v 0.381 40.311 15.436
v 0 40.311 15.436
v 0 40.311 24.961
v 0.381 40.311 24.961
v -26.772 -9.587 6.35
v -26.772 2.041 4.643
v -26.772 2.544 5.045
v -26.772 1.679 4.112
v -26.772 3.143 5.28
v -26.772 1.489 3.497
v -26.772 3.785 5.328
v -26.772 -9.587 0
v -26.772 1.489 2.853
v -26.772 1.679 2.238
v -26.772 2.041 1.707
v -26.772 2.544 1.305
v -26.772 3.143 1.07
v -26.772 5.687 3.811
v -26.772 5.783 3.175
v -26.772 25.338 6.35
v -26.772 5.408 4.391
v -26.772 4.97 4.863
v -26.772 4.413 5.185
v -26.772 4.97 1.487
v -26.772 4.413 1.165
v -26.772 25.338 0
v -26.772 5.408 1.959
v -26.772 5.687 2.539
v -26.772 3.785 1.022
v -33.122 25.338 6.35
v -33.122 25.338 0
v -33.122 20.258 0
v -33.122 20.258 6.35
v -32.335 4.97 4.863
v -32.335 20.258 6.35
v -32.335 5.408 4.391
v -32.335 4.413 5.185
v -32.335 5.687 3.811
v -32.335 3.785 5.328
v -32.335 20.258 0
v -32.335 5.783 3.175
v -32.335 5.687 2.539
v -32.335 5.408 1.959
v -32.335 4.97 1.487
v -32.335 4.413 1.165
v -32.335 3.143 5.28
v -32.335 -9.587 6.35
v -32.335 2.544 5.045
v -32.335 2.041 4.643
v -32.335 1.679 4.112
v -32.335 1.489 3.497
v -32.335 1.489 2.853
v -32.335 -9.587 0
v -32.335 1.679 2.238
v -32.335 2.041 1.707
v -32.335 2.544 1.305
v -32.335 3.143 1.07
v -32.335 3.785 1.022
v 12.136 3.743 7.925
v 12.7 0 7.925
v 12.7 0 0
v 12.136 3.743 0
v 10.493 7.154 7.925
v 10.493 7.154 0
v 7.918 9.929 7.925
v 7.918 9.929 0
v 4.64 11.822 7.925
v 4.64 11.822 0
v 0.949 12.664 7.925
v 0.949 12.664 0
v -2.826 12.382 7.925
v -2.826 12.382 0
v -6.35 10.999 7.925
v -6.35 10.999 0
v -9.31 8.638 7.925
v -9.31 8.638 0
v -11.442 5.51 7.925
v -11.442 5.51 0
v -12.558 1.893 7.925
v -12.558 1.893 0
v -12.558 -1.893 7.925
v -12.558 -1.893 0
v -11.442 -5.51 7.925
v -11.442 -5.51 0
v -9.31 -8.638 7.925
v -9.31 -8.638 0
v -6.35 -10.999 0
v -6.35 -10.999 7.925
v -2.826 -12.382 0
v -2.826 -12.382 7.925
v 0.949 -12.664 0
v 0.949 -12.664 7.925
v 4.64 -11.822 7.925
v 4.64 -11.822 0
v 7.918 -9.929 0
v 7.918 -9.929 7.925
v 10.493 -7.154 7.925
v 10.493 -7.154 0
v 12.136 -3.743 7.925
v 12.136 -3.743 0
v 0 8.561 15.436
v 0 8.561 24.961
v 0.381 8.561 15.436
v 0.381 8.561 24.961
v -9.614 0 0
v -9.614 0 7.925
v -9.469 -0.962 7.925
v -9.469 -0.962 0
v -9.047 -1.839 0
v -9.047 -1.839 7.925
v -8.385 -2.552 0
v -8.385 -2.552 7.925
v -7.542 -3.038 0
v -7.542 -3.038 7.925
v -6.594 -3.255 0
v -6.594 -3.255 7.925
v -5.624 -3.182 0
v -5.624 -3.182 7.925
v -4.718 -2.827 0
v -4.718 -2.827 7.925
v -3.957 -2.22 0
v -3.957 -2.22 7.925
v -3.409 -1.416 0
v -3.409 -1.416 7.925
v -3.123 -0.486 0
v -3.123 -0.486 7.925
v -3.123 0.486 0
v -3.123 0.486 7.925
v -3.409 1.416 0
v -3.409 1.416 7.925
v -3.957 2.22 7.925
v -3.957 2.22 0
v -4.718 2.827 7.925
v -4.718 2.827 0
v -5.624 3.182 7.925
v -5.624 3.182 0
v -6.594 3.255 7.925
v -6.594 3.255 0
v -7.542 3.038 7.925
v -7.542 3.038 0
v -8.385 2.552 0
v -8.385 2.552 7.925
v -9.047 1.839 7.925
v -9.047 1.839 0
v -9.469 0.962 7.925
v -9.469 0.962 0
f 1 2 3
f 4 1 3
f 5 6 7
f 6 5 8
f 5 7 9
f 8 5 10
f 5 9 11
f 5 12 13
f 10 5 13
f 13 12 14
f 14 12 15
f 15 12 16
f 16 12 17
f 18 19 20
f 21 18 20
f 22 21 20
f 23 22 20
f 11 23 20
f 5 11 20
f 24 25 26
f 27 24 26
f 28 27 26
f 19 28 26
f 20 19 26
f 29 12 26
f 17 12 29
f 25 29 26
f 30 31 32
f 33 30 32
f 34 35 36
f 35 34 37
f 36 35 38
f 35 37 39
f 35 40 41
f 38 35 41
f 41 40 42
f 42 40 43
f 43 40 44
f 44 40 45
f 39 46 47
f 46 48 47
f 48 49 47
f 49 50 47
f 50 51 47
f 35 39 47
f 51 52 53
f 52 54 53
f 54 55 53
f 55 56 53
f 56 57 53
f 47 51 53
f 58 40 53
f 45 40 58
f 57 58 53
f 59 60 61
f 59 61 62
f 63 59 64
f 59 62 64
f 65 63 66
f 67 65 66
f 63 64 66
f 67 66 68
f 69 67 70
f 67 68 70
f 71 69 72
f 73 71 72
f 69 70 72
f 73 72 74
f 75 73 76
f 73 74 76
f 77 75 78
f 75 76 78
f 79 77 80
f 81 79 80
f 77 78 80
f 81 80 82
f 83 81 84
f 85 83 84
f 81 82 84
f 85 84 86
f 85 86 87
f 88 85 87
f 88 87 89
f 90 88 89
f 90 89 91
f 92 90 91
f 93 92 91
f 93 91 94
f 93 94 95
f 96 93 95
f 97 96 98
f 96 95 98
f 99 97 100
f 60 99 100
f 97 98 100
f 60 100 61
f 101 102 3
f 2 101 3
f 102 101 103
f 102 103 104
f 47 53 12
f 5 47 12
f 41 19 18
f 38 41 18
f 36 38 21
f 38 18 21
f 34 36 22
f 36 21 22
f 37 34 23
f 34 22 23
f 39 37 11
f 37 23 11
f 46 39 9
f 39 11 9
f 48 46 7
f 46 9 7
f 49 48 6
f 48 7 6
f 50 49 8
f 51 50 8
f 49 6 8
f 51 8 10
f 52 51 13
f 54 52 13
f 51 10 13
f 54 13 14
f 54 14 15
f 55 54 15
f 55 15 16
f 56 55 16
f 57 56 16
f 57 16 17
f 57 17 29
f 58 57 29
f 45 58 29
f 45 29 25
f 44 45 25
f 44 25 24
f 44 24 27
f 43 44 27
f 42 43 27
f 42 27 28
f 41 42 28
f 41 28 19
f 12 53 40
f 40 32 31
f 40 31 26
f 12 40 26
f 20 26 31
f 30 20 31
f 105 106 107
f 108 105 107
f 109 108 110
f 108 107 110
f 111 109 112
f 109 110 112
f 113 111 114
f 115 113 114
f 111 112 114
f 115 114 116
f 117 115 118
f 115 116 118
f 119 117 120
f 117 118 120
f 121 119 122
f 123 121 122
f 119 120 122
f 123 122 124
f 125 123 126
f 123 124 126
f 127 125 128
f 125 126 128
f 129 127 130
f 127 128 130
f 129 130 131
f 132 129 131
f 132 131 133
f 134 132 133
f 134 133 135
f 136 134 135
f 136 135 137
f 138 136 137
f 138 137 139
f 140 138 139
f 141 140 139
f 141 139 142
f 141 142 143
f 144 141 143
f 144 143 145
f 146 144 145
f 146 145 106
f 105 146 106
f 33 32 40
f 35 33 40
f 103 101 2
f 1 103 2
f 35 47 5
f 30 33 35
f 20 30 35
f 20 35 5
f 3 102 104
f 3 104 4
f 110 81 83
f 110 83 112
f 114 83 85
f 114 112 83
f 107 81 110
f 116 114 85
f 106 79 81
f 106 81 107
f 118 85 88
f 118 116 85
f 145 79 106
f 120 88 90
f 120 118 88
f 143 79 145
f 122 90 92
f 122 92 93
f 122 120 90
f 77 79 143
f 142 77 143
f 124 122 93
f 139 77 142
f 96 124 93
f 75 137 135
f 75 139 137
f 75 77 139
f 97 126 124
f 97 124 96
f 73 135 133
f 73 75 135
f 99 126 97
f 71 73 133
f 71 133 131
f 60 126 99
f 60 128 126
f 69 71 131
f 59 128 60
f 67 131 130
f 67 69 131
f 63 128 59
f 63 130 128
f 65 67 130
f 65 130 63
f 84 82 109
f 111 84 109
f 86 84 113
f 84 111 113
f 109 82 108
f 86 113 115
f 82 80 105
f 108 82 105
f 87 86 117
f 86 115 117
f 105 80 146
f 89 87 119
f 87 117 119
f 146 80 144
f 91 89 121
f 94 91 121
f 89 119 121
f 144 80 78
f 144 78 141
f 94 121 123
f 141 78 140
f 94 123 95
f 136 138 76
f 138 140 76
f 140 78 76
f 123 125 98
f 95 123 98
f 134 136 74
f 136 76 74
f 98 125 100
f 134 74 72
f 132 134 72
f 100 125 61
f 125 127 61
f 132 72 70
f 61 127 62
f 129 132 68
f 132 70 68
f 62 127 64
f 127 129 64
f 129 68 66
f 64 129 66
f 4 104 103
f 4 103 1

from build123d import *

# Parameters (mm, degrees)
F0_R     = 12.7
F1_DEPTH = 7.9248
F2_D     = 6.5278
F4_DEPTH = 6.35
F6_D     = 4.318
F7_W     = 31.75
F7_H     = 9.525
F8_DEPTH = 0.381


with BuildPart() as f1:
    # F0 (on Top) → F1 (new body)
    with BuildSketch(Plane.XY):
        Circle(F0_R)
    extrude(amount=F1_DEPTH)

    # F2 (through all)
    with Locations(Plane(origin=(0, 0, 0), x_dir=(1, 0, 0), z_dir=(0, 0, -1))):
        with Locations((-6.35, 0)):
            Hole(F2_D / 2)


with BuildPart() as f4:
    # F3 (on Top) → F4 (new body)
    with BuildSketch(Plane.XY):
        Polygon((-26.772261326, 25.338197906), (-33.122261326, 25.338197906), (-33.122261326, 20.258197906), (-32.334861326, 20.258197906), (-32.334861326, -9.586802094), (-26.772261326, -9.586802094), align=None)
    extrude(amount=F4_DEPTH)

    # F6 (through all)
    with Locations(Plane(origin=(-32.334861326, 0, 0), x_dir=(0, -1, 0), z_dir=(-1, 0, 0))):
        with Locations((-3.6238329485, 3.175)):
            Hole(F6_D / 2)


with BuildPart() as f8:
    # F7 (on Right) → F8 (new body)
    with BuildSketch(Plane.YZ):
        with Locations((24.4357057797, 20.1984364539)):
            Rectangle(F7_W, F7_H)
    extrude(amount=F8_DEPTH)


solid = Compound([f1.part, f4.part, f8.part])
